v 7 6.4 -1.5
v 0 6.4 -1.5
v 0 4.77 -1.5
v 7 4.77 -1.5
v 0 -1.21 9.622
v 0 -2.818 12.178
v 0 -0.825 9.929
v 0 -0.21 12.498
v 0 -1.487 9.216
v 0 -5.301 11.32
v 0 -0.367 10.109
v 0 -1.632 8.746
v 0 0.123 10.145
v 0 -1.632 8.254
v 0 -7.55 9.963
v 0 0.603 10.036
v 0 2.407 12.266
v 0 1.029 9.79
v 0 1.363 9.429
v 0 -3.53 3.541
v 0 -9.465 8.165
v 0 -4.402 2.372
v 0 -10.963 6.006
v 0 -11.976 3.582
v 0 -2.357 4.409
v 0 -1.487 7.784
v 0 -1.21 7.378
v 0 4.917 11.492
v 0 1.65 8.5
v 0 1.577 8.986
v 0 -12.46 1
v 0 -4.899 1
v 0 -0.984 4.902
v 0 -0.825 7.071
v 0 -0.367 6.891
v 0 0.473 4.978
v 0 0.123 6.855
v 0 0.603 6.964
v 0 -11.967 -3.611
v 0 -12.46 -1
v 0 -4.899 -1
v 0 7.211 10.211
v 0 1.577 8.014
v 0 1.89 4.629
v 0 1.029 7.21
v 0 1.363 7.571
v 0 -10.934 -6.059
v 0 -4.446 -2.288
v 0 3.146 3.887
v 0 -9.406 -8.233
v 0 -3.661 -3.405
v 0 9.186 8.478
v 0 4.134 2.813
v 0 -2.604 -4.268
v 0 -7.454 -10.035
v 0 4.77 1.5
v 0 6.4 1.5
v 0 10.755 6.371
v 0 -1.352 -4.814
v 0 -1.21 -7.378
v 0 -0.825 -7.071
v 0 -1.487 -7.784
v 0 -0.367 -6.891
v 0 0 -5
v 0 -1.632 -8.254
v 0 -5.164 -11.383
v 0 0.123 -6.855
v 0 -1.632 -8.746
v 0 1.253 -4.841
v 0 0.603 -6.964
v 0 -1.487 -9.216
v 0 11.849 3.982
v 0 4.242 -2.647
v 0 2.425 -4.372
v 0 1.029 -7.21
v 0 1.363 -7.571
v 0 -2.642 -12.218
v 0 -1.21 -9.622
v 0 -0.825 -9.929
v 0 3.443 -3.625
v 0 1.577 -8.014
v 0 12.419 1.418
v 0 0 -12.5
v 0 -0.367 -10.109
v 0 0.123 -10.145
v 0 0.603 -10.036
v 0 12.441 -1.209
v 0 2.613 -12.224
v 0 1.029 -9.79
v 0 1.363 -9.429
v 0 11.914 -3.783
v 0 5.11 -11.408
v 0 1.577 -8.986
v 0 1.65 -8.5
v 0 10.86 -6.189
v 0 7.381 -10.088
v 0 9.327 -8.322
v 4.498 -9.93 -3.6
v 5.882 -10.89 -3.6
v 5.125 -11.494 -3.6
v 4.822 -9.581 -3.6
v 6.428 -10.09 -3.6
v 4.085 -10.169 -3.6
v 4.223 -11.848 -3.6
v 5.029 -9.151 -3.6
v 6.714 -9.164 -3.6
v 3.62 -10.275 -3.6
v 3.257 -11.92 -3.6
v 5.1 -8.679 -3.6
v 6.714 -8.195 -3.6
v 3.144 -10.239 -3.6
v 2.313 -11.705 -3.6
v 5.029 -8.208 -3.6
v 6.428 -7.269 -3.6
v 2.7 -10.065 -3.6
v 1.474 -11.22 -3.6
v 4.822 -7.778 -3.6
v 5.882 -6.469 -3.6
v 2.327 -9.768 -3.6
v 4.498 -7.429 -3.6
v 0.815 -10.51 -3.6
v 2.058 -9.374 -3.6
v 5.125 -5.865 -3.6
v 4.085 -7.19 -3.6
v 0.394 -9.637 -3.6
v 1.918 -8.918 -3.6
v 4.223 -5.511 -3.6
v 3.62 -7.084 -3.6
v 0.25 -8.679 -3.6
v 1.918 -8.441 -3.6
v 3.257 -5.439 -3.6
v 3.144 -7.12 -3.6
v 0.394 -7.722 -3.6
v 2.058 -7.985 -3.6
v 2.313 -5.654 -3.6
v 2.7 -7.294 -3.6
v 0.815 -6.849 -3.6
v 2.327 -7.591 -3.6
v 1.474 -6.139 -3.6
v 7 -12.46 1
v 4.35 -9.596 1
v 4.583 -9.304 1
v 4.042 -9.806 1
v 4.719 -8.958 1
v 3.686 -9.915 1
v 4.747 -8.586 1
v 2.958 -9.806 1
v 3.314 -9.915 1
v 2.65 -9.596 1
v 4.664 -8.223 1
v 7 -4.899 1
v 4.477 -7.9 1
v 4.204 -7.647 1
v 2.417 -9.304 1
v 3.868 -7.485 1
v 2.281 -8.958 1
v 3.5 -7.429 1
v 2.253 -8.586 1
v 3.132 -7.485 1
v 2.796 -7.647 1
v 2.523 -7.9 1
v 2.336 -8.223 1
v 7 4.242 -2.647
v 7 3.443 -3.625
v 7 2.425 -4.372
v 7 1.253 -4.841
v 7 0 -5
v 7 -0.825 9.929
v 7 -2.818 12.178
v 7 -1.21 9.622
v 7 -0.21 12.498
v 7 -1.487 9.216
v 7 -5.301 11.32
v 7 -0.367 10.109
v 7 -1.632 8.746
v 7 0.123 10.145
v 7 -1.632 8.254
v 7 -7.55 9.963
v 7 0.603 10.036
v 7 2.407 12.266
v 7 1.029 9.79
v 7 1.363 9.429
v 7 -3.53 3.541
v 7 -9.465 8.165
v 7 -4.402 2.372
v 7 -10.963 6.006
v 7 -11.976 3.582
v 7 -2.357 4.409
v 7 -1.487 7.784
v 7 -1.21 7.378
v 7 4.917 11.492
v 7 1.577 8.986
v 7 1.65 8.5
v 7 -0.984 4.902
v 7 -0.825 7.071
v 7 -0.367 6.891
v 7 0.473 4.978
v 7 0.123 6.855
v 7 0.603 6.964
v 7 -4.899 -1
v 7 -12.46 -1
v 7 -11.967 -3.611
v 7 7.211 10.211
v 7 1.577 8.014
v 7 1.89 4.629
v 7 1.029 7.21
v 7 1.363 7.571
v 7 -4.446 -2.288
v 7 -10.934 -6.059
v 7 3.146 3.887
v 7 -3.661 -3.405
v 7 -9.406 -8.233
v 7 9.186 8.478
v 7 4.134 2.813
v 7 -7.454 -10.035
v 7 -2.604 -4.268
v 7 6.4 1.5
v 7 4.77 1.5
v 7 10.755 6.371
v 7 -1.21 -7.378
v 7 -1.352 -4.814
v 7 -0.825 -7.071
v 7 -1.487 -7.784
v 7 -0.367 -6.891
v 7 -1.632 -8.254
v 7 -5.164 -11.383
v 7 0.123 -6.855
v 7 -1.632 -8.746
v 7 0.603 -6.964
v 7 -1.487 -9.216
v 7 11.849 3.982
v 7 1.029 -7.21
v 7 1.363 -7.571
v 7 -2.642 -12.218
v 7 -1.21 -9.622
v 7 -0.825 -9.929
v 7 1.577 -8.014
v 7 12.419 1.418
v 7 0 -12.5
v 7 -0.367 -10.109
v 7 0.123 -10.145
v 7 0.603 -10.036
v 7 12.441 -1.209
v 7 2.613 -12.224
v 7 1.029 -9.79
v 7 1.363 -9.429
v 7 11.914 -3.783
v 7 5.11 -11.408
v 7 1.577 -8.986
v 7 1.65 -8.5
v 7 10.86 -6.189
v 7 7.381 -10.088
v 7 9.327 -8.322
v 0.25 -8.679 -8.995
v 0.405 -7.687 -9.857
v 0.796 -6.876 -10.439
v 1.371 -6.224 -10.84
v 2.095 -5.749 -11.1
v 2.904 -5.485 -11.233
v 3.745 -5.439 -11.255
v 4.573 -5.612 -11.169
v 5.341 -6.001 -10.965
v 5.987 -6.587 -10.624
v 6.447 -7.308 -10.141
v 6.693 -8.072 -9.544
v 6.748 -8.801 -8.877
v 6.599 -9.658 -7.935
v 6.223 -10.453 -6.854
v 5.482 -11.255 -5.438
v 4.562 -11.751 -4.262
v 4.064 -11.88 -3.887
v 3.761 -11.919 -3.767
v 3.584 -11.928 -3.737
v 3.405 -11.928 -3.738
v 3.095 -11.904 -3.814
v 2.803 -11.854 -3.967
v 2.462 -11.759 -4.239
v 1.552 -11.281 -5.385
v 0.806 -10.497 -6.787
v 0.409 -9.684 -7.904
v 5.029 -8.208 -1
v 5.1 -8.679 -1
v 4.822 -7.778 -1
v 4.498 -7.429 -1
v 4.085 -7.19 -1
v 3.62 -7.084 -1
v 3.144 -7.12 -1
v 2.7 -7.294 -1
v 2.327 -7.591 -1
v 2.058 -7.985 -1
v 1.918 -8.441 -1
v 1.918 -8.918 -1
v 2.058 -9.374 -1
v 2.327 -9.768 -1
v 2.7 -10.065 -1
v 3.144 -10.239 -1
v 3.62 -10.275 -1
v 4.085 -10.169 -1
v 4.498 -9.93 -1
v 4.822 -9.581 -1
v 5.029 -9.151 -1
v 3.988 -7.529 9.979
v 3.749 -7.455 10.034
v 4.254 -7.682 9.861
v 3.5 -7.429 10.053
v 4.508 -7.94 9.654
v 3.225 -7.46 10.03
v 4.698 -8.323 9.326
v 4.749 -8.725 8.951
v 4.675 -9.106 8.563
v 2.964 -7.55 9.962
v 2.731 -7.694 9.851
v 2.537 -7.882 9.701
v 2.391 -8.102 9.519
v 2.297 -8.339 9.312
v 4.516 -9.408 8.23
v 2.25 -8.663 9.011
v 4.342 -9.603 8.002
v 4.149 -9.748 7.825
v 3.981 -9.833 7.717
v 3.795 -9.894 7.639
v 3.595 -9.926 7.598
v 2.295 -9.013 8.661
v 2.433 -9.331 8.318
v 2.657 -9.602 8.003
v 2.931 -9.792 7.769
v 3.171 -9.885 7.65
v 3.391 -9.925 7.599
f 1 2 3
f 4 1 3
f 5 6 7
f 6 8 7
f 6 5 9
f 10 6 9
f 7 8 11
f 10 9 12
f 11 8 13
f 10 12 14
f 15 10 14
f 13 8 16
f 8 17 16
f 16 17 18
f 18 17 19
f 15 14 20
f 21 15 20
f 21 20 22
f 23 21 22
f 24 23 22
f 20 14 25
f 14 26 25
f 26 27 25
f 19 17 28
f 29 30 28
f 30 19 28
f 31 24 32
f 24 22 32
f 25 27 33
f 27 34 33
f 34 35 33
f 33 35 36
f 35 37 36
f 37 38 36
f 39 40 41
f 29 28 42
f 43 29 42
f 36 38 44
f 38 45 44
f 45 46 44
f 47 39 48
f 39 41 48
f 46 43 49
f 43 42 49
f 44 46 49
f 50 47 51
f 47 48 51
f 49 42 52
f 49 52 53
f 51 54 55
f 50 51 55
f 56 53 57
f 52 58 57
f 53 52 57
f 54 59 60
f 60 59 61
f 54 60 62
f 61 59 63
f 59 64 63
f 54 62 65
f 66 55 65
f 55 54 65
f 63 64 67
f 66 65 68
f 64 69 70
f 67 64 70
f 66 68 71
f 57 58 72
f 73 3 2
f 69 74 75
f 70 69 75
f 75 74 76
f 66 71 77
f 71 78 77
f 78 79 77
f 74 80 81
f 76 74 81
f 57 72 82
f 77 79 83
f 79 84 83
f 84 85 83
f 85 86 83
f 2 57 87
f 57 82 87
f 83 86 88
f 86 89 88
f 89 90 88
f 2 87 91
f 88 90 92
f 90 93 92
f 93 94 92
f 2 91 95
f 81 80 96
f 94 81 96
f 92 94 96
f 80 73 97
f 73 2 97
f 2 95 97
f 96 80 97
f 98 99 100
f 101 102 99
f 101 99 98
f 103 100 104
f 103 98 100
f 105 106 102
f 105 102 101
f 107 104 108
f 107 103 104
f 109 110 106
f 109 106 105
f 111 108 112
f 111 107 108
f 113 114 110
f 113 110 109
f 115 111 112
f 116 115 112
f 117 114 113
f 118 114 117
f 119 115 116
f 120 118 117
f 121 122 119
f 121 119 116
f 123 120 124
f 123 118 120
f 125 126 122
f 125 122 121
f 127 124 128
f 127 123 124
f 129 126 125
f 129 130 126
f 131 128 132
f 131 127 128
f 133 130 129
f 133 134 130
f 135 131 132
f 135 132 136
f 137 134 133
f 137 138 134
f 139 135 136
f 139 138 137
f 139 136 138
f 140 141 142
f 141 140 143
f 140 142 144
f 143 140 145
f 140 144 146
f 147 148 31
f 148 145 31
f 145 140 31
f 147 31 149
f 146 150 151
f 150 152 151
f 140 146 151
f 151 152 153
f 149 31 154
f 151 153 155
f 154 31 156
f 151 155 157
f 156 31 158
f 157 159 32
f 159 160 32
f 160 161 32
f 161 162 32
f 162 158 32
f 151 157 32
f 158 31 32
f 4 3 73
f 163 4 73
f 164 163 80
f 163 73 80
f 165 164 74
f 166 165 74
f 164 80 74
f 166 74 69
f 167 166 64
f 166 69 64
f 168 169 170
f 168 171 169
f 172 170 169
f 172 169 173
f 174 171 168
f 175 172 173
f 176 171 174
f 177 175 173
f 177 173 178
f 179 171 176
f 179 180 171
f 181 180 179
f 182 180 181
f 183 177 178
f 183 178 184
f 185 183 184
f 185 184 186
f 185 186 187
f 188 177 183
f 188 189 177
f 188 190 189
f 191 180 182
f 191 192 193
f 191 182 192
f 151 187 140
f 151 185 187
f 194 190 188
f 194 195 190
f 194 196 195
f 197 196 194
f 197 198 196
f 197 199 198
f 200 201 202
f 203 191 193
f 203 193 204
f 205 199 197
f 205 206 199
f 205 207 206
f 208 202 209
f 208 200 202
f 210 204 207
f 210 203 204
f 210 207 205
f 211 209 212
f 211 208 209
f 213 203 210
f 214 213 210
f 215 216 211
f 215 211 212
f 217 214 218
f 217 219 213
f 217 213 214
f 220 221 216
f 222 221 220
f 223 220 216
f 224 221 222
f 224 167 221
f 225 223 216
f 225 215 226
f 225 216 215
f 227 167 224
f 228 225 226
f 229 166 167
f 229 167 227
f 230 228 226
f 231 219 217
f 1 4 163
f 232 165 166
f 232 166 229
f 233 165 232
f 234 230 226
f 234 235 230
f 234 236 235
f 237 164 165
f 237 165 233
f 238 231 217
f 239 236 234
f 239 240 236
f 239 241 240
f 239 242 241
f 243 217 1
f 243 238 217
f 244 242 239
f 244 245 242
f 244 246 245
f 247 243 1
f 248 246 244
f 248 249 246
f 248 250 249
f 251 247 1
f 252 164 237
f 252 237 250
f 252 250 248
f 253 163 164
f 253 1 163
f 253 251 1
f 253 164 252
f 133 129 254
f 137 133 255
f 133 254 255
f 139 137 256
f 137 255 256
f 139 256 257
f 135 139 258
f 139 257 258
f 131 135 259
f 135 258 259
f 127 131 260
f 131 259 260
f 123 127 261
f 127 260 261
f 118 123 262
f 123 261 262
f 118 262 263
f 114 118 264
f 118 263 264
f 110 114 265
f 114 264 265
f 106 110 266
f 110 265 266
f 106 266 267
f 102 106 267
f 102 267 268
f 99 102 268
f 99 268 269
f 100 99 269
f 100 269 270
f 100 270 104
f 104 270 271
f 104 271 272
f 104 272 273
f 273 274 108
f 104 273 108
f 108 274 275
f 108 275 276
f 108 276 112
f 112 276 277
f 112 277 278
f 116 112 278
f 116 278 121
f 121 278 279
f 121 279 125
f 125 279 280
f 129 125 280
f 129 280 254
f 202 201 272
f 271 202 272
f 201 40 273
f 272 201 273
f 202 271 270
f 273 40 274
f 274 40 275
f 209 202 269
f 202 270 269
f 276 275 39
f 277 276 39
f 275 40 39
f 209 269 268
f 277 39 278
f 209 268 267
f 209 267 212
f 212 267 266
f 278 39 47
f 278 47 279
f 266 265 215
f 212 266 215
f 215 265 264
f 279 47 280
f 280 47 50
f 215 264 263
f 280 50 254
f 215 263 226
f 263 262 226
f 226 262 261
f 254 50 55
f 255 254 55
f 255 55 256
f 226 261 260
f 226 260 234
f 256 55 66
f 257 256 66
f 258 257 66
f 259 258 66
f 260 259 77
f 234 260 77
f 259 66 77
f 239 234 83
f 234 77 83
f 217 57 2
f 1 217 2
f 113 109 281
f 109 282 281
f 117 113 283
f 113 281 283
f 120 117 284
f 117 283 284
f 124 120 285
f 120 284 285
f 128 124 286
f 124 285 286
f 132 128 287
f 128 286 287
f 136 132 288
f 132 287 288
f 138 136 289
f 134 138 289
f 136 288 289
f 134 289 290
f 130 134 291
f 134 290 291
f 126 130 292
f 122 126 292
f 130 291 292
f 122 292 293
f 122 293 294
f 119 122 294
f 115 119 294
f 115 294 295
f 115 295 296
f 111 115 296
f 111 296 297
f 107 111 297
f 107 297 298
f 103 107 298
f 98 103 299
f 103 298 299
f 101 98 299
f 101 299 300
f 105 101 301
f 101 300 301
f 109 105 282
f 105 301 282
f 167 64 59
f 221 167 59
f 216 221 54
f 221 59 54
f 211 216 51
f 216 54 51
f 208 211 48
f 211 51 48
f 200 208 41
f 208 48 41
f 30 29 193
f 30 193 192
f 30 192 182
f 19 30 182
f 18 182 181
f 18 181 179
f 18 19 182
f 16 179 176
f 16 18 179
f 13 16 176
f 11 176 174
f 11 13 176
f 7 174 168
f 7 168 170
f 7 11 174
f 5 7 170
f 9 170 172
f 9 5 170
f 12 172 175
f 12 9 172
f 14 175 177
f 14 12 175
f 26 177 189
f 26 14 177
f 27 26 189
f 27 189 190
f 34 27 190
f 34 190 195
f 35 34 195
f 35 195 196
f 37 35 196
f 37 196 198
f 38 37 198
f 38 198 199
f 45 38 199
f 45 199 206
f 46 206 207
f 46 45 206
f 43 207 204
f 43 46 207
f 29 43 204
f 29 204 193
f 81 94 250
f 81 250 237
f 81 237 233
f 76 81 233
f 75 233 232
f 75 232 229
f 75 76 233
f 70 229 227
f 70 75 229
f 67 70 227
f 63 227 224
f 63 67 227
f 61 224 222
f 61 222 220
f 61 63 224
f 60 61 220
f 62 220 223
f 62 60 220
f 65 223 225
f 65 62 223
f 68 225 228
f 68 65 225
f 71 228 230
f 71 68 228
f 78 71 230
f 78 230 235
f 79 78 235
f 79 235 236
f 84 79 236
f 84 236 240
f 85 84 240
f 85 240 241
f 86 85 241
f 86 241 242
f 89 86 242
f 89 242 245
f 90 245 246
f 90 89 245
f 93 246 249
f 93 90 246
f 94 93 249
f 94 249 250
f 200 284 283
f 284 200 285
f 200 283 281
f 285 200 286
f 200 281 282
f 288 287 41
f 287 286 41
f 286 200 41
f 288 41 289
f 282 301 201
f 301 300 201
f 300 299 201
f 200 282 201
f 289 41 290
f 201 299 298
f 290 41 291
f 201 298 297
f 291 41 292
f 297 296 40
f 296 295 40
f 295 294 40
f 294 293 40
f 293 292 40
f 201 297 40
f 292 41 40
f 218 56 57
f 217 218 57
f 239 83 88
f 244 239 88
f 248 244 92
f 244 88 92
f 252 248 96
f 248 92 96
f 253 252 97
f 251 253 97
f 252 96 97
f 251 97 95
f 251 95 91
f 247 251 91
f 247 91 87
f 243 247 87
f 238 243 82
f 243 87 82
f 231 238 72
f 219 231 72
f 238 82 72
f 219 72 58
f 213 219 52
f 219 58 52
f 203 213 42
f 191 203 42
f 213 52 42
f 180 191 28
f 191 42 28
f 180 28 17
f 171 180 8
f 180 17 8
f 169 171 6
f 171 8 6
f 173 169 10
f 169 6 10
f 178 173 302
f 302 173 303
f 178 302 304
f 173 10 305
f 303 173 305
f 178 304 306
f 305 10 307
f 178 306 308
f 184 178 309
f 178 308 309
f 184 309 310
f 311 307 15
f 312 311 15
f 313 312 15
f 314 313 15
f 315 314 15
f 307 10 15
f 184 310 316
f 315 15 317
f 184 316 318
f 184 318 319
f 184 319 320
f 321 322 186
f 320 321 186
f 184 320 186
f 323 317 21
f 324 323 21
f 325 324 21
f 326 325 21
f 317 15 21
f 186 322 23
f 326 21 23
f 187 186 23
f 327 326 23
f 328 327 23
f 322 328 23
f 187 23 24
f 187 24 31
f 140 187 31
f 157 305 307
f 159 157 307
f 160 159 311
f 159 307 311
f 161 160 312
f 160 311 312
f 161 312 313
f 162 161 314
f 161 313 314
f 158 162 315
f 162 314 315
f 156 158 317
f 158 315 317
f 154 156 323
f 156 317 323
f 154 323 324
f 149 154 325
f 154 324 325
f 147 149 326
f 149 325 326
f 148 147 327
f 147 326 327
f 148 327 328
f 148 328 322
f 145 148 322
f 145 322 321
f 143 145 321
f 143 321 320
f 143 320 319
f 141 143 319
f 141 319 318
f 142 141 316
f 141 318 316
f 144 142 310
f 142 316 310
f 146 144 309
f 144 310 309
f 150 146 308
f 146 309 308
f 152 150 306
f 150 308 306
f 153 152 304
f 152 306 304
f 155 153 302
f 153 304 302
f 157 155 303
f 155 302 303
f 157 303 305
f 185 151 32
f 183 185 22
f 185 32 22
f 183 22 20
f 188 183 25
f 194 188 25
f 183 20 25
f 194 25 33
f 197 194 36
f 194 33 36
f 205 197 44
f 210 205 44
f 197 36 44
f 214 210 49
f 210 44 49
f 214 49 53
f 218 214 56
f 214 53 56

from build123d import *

# Parameters (mm, degrees)
SKETCH1_R                                           = 1
BOSS_EXTRUDE1_DEPTH                                 = 7
SKETCH3_W                                           = 1.25
SKETCH3_H                                           = 11.5
CBORE_FOR_M3_HEX_SOCKET_HEAD_CAP_SCREW1_D           = 3.2
CBORE_FOR_M3_HEX_SOCKET_HEAD_CAP_SCREW1_DEPTH       = 6
CBORE_FOR_M3_HEX_SOCKET_HEAD_CAP_SCREW1_CBORE_D     = 6.5
CBORE_FOR_M3_HEX_SOCKET_HEAD_CAP_SCREW1_CBORE_DEPTH = 3.4
CBORE_FOR_M3_HEX_SOCKET_HEAD_CAP_SCREW1_TIP         = 0.96137699
SKETCH9_R                                           = 3.25
CUT_EXTRUDE1_DEPTH                                  = 22.551334231
TAP_DRILL_FOR_M4_TAP1_OUTLINE_R                     = 1.65
TAP_DRILL_FOR_M4_TAP1_OUTLINE_R_2                   = 1
TAP_DRILL_FOR_M4_TAP1_DEPTH                         = 7


# Read off the part's stored shape, not the designer's step: Tap Drill for M4 Tap1
with BuildPart() as part:
    # Sketch1 → Boss-Extrude1 (new body)
    with BuildSketch(Plane(origin=(0, 0, 0), x_dir=(0, 0, -1), z_dir=(1, 0, 0))):
        with BuildLine():
            ThreePointArc((-1, -4.898979486), (-4.993327693, -0.258221909), (-1.5, 4.769696007))
            Line((-1.5, 4.769696007), (-1.5, 6.4))
            Line((-1.5, 6.4), (1.5, 6.4))
            Line((1.5, 6.4), (1.5, 4.769696007))
            ThreePointArc((1.5, 4.769696007), (4.031128874, 2.958039892), (5, 0))
            ThreePointArc((5, 0), (3.872983346, -3.16227766), (1, -4.898979486))
            Line((1, -4.898979486), (1, -12.459935794))
            ThreePointArc((1, -12.459935794), (9.185586535, -8.477912479), (12.5, 0))
            ThreePointArc((12.5, 0), (-8.477912479, 9.185586535), (-1, -12.459935794))
            Line((-1, -12.459935794), (-1, -4.898979486))
        make_face()
        with Locations((-8.5, 0)):
            Circle(SKETCH1_R, mode=Mode.SUBTRACT)
        with Locations((8.5, 0)):
            Circle(SKETCH1_R, mode=Mode.SUBTRACT)
    extrude(amount=BOSS_EXTRUDE1_DEPTH)

    # Sketch3 → Tap Drill for M3 Tap2 (revolve, cut)
    with BuildSketch(Plane(origin=(3.5, -8.67945764, 1), x_dir=(0, 1, 0), z_dir=(1, 0, 0))):
        with Locations((0.625, 5.75)):
            Rectangle(SKETCH3_W, SKETCH3_H)
    revolve(axis=Axis((3.5, -8.67945764, -5.35), (0, 0, 1)), mode=Mode.SUBTRACT)

    # CBORE for M3 Hex Socket Head Cap Screw1
    with Locations(Plane(origin=(0, 0, -7), x_dir=(-1, 0, 0), z_dir=(0, 0, -1))):
        with Locations((-3.5, -8.67945764)):
            CounterBoreHole(CBORE_FOR_M3_HEX_SOCKET_HEAD_CAP_SCREW1_D / 2, CBORE_FOR_M3_HEX_SOCKET_HEAD_CAP_SCREW1_CBORE_D / 2, CBORE_FOR_M3_HEX_SOCKET_HEAD_CAP_SCREW1_CBORE_DEPTH, depth=CBORE_FOR_M3_HEX_SOCKET_HEAD_CAP_SCREW1_DEPTH)
            with Locations((0, 0, -(CBORE_FOR_M3_HEX_SOCKET_HEAD_CAP_SCREW1_DEPTH + CBORE_FOR_M3_HEX_SOCKET_HEAD_CAP_SCREW1_TIP / 2))):  # 118° drill point
                Cone(0, CBORE_FOR_M3_HEX_SOCKET_HEAD_CAP_SCREW1_D / 2, CBORE_FOR_M3_HEX_SOCKET_HEAD_CAP_SCREW1_TIP, mode=Mode.SUBTRACT)

    # Sketch9 → Cut-Extrude1 (cut, through all)
    with BuildSketch(Plane(origin=(0, 0, -3.6), x_dir=(-1, 0, 0), z_dir=(0, 0, -1))):
        with Locations(Location((-3.5, -8.67945764, 0), (0, 0, 90))):
            Circle(SKETCH9_R)
    extrude(amount=CUT_EXTRUDE1_DEPTH, mode=Mode.SUBTRACT)

    # Tap Drill for M4 Tap1 outline → Tap Drill for M4 Tap1 (cut)
    # profile 1 of 2: a face of its own
    with BuildSketch(Plane.YZ):
        with Locations((0, 8.5)):
            Circle(TAP_DRILL_FOR_M4_TAP1_OUTLINE_R)
        with Locations((0, 8.5)):
            Circle(TAP_DRILL_FOR_M4_TAP1_OUTLINE_R_2, mode=Mode.SUBTRACT)
    # profile 2 of 2: a face of its own
    with BuildSketch(Plane.YZ):
        with Locations((0, -8.5)):
            Circle(TAP_DRILL_FOR_M4_TAP1_OUTLINE_R)
        with Locations((0, -8.5)):
            Circle(TAP_DRILL_FOR_M4_TAP1_OUTLINE_R_2, mode=Mode.SUBTRACT)
    extrude(amount=TAP_DRILL_FOR_M4_TAP1_DEPTH, mode=Mode.SUBTRACT)


solid = part.part
